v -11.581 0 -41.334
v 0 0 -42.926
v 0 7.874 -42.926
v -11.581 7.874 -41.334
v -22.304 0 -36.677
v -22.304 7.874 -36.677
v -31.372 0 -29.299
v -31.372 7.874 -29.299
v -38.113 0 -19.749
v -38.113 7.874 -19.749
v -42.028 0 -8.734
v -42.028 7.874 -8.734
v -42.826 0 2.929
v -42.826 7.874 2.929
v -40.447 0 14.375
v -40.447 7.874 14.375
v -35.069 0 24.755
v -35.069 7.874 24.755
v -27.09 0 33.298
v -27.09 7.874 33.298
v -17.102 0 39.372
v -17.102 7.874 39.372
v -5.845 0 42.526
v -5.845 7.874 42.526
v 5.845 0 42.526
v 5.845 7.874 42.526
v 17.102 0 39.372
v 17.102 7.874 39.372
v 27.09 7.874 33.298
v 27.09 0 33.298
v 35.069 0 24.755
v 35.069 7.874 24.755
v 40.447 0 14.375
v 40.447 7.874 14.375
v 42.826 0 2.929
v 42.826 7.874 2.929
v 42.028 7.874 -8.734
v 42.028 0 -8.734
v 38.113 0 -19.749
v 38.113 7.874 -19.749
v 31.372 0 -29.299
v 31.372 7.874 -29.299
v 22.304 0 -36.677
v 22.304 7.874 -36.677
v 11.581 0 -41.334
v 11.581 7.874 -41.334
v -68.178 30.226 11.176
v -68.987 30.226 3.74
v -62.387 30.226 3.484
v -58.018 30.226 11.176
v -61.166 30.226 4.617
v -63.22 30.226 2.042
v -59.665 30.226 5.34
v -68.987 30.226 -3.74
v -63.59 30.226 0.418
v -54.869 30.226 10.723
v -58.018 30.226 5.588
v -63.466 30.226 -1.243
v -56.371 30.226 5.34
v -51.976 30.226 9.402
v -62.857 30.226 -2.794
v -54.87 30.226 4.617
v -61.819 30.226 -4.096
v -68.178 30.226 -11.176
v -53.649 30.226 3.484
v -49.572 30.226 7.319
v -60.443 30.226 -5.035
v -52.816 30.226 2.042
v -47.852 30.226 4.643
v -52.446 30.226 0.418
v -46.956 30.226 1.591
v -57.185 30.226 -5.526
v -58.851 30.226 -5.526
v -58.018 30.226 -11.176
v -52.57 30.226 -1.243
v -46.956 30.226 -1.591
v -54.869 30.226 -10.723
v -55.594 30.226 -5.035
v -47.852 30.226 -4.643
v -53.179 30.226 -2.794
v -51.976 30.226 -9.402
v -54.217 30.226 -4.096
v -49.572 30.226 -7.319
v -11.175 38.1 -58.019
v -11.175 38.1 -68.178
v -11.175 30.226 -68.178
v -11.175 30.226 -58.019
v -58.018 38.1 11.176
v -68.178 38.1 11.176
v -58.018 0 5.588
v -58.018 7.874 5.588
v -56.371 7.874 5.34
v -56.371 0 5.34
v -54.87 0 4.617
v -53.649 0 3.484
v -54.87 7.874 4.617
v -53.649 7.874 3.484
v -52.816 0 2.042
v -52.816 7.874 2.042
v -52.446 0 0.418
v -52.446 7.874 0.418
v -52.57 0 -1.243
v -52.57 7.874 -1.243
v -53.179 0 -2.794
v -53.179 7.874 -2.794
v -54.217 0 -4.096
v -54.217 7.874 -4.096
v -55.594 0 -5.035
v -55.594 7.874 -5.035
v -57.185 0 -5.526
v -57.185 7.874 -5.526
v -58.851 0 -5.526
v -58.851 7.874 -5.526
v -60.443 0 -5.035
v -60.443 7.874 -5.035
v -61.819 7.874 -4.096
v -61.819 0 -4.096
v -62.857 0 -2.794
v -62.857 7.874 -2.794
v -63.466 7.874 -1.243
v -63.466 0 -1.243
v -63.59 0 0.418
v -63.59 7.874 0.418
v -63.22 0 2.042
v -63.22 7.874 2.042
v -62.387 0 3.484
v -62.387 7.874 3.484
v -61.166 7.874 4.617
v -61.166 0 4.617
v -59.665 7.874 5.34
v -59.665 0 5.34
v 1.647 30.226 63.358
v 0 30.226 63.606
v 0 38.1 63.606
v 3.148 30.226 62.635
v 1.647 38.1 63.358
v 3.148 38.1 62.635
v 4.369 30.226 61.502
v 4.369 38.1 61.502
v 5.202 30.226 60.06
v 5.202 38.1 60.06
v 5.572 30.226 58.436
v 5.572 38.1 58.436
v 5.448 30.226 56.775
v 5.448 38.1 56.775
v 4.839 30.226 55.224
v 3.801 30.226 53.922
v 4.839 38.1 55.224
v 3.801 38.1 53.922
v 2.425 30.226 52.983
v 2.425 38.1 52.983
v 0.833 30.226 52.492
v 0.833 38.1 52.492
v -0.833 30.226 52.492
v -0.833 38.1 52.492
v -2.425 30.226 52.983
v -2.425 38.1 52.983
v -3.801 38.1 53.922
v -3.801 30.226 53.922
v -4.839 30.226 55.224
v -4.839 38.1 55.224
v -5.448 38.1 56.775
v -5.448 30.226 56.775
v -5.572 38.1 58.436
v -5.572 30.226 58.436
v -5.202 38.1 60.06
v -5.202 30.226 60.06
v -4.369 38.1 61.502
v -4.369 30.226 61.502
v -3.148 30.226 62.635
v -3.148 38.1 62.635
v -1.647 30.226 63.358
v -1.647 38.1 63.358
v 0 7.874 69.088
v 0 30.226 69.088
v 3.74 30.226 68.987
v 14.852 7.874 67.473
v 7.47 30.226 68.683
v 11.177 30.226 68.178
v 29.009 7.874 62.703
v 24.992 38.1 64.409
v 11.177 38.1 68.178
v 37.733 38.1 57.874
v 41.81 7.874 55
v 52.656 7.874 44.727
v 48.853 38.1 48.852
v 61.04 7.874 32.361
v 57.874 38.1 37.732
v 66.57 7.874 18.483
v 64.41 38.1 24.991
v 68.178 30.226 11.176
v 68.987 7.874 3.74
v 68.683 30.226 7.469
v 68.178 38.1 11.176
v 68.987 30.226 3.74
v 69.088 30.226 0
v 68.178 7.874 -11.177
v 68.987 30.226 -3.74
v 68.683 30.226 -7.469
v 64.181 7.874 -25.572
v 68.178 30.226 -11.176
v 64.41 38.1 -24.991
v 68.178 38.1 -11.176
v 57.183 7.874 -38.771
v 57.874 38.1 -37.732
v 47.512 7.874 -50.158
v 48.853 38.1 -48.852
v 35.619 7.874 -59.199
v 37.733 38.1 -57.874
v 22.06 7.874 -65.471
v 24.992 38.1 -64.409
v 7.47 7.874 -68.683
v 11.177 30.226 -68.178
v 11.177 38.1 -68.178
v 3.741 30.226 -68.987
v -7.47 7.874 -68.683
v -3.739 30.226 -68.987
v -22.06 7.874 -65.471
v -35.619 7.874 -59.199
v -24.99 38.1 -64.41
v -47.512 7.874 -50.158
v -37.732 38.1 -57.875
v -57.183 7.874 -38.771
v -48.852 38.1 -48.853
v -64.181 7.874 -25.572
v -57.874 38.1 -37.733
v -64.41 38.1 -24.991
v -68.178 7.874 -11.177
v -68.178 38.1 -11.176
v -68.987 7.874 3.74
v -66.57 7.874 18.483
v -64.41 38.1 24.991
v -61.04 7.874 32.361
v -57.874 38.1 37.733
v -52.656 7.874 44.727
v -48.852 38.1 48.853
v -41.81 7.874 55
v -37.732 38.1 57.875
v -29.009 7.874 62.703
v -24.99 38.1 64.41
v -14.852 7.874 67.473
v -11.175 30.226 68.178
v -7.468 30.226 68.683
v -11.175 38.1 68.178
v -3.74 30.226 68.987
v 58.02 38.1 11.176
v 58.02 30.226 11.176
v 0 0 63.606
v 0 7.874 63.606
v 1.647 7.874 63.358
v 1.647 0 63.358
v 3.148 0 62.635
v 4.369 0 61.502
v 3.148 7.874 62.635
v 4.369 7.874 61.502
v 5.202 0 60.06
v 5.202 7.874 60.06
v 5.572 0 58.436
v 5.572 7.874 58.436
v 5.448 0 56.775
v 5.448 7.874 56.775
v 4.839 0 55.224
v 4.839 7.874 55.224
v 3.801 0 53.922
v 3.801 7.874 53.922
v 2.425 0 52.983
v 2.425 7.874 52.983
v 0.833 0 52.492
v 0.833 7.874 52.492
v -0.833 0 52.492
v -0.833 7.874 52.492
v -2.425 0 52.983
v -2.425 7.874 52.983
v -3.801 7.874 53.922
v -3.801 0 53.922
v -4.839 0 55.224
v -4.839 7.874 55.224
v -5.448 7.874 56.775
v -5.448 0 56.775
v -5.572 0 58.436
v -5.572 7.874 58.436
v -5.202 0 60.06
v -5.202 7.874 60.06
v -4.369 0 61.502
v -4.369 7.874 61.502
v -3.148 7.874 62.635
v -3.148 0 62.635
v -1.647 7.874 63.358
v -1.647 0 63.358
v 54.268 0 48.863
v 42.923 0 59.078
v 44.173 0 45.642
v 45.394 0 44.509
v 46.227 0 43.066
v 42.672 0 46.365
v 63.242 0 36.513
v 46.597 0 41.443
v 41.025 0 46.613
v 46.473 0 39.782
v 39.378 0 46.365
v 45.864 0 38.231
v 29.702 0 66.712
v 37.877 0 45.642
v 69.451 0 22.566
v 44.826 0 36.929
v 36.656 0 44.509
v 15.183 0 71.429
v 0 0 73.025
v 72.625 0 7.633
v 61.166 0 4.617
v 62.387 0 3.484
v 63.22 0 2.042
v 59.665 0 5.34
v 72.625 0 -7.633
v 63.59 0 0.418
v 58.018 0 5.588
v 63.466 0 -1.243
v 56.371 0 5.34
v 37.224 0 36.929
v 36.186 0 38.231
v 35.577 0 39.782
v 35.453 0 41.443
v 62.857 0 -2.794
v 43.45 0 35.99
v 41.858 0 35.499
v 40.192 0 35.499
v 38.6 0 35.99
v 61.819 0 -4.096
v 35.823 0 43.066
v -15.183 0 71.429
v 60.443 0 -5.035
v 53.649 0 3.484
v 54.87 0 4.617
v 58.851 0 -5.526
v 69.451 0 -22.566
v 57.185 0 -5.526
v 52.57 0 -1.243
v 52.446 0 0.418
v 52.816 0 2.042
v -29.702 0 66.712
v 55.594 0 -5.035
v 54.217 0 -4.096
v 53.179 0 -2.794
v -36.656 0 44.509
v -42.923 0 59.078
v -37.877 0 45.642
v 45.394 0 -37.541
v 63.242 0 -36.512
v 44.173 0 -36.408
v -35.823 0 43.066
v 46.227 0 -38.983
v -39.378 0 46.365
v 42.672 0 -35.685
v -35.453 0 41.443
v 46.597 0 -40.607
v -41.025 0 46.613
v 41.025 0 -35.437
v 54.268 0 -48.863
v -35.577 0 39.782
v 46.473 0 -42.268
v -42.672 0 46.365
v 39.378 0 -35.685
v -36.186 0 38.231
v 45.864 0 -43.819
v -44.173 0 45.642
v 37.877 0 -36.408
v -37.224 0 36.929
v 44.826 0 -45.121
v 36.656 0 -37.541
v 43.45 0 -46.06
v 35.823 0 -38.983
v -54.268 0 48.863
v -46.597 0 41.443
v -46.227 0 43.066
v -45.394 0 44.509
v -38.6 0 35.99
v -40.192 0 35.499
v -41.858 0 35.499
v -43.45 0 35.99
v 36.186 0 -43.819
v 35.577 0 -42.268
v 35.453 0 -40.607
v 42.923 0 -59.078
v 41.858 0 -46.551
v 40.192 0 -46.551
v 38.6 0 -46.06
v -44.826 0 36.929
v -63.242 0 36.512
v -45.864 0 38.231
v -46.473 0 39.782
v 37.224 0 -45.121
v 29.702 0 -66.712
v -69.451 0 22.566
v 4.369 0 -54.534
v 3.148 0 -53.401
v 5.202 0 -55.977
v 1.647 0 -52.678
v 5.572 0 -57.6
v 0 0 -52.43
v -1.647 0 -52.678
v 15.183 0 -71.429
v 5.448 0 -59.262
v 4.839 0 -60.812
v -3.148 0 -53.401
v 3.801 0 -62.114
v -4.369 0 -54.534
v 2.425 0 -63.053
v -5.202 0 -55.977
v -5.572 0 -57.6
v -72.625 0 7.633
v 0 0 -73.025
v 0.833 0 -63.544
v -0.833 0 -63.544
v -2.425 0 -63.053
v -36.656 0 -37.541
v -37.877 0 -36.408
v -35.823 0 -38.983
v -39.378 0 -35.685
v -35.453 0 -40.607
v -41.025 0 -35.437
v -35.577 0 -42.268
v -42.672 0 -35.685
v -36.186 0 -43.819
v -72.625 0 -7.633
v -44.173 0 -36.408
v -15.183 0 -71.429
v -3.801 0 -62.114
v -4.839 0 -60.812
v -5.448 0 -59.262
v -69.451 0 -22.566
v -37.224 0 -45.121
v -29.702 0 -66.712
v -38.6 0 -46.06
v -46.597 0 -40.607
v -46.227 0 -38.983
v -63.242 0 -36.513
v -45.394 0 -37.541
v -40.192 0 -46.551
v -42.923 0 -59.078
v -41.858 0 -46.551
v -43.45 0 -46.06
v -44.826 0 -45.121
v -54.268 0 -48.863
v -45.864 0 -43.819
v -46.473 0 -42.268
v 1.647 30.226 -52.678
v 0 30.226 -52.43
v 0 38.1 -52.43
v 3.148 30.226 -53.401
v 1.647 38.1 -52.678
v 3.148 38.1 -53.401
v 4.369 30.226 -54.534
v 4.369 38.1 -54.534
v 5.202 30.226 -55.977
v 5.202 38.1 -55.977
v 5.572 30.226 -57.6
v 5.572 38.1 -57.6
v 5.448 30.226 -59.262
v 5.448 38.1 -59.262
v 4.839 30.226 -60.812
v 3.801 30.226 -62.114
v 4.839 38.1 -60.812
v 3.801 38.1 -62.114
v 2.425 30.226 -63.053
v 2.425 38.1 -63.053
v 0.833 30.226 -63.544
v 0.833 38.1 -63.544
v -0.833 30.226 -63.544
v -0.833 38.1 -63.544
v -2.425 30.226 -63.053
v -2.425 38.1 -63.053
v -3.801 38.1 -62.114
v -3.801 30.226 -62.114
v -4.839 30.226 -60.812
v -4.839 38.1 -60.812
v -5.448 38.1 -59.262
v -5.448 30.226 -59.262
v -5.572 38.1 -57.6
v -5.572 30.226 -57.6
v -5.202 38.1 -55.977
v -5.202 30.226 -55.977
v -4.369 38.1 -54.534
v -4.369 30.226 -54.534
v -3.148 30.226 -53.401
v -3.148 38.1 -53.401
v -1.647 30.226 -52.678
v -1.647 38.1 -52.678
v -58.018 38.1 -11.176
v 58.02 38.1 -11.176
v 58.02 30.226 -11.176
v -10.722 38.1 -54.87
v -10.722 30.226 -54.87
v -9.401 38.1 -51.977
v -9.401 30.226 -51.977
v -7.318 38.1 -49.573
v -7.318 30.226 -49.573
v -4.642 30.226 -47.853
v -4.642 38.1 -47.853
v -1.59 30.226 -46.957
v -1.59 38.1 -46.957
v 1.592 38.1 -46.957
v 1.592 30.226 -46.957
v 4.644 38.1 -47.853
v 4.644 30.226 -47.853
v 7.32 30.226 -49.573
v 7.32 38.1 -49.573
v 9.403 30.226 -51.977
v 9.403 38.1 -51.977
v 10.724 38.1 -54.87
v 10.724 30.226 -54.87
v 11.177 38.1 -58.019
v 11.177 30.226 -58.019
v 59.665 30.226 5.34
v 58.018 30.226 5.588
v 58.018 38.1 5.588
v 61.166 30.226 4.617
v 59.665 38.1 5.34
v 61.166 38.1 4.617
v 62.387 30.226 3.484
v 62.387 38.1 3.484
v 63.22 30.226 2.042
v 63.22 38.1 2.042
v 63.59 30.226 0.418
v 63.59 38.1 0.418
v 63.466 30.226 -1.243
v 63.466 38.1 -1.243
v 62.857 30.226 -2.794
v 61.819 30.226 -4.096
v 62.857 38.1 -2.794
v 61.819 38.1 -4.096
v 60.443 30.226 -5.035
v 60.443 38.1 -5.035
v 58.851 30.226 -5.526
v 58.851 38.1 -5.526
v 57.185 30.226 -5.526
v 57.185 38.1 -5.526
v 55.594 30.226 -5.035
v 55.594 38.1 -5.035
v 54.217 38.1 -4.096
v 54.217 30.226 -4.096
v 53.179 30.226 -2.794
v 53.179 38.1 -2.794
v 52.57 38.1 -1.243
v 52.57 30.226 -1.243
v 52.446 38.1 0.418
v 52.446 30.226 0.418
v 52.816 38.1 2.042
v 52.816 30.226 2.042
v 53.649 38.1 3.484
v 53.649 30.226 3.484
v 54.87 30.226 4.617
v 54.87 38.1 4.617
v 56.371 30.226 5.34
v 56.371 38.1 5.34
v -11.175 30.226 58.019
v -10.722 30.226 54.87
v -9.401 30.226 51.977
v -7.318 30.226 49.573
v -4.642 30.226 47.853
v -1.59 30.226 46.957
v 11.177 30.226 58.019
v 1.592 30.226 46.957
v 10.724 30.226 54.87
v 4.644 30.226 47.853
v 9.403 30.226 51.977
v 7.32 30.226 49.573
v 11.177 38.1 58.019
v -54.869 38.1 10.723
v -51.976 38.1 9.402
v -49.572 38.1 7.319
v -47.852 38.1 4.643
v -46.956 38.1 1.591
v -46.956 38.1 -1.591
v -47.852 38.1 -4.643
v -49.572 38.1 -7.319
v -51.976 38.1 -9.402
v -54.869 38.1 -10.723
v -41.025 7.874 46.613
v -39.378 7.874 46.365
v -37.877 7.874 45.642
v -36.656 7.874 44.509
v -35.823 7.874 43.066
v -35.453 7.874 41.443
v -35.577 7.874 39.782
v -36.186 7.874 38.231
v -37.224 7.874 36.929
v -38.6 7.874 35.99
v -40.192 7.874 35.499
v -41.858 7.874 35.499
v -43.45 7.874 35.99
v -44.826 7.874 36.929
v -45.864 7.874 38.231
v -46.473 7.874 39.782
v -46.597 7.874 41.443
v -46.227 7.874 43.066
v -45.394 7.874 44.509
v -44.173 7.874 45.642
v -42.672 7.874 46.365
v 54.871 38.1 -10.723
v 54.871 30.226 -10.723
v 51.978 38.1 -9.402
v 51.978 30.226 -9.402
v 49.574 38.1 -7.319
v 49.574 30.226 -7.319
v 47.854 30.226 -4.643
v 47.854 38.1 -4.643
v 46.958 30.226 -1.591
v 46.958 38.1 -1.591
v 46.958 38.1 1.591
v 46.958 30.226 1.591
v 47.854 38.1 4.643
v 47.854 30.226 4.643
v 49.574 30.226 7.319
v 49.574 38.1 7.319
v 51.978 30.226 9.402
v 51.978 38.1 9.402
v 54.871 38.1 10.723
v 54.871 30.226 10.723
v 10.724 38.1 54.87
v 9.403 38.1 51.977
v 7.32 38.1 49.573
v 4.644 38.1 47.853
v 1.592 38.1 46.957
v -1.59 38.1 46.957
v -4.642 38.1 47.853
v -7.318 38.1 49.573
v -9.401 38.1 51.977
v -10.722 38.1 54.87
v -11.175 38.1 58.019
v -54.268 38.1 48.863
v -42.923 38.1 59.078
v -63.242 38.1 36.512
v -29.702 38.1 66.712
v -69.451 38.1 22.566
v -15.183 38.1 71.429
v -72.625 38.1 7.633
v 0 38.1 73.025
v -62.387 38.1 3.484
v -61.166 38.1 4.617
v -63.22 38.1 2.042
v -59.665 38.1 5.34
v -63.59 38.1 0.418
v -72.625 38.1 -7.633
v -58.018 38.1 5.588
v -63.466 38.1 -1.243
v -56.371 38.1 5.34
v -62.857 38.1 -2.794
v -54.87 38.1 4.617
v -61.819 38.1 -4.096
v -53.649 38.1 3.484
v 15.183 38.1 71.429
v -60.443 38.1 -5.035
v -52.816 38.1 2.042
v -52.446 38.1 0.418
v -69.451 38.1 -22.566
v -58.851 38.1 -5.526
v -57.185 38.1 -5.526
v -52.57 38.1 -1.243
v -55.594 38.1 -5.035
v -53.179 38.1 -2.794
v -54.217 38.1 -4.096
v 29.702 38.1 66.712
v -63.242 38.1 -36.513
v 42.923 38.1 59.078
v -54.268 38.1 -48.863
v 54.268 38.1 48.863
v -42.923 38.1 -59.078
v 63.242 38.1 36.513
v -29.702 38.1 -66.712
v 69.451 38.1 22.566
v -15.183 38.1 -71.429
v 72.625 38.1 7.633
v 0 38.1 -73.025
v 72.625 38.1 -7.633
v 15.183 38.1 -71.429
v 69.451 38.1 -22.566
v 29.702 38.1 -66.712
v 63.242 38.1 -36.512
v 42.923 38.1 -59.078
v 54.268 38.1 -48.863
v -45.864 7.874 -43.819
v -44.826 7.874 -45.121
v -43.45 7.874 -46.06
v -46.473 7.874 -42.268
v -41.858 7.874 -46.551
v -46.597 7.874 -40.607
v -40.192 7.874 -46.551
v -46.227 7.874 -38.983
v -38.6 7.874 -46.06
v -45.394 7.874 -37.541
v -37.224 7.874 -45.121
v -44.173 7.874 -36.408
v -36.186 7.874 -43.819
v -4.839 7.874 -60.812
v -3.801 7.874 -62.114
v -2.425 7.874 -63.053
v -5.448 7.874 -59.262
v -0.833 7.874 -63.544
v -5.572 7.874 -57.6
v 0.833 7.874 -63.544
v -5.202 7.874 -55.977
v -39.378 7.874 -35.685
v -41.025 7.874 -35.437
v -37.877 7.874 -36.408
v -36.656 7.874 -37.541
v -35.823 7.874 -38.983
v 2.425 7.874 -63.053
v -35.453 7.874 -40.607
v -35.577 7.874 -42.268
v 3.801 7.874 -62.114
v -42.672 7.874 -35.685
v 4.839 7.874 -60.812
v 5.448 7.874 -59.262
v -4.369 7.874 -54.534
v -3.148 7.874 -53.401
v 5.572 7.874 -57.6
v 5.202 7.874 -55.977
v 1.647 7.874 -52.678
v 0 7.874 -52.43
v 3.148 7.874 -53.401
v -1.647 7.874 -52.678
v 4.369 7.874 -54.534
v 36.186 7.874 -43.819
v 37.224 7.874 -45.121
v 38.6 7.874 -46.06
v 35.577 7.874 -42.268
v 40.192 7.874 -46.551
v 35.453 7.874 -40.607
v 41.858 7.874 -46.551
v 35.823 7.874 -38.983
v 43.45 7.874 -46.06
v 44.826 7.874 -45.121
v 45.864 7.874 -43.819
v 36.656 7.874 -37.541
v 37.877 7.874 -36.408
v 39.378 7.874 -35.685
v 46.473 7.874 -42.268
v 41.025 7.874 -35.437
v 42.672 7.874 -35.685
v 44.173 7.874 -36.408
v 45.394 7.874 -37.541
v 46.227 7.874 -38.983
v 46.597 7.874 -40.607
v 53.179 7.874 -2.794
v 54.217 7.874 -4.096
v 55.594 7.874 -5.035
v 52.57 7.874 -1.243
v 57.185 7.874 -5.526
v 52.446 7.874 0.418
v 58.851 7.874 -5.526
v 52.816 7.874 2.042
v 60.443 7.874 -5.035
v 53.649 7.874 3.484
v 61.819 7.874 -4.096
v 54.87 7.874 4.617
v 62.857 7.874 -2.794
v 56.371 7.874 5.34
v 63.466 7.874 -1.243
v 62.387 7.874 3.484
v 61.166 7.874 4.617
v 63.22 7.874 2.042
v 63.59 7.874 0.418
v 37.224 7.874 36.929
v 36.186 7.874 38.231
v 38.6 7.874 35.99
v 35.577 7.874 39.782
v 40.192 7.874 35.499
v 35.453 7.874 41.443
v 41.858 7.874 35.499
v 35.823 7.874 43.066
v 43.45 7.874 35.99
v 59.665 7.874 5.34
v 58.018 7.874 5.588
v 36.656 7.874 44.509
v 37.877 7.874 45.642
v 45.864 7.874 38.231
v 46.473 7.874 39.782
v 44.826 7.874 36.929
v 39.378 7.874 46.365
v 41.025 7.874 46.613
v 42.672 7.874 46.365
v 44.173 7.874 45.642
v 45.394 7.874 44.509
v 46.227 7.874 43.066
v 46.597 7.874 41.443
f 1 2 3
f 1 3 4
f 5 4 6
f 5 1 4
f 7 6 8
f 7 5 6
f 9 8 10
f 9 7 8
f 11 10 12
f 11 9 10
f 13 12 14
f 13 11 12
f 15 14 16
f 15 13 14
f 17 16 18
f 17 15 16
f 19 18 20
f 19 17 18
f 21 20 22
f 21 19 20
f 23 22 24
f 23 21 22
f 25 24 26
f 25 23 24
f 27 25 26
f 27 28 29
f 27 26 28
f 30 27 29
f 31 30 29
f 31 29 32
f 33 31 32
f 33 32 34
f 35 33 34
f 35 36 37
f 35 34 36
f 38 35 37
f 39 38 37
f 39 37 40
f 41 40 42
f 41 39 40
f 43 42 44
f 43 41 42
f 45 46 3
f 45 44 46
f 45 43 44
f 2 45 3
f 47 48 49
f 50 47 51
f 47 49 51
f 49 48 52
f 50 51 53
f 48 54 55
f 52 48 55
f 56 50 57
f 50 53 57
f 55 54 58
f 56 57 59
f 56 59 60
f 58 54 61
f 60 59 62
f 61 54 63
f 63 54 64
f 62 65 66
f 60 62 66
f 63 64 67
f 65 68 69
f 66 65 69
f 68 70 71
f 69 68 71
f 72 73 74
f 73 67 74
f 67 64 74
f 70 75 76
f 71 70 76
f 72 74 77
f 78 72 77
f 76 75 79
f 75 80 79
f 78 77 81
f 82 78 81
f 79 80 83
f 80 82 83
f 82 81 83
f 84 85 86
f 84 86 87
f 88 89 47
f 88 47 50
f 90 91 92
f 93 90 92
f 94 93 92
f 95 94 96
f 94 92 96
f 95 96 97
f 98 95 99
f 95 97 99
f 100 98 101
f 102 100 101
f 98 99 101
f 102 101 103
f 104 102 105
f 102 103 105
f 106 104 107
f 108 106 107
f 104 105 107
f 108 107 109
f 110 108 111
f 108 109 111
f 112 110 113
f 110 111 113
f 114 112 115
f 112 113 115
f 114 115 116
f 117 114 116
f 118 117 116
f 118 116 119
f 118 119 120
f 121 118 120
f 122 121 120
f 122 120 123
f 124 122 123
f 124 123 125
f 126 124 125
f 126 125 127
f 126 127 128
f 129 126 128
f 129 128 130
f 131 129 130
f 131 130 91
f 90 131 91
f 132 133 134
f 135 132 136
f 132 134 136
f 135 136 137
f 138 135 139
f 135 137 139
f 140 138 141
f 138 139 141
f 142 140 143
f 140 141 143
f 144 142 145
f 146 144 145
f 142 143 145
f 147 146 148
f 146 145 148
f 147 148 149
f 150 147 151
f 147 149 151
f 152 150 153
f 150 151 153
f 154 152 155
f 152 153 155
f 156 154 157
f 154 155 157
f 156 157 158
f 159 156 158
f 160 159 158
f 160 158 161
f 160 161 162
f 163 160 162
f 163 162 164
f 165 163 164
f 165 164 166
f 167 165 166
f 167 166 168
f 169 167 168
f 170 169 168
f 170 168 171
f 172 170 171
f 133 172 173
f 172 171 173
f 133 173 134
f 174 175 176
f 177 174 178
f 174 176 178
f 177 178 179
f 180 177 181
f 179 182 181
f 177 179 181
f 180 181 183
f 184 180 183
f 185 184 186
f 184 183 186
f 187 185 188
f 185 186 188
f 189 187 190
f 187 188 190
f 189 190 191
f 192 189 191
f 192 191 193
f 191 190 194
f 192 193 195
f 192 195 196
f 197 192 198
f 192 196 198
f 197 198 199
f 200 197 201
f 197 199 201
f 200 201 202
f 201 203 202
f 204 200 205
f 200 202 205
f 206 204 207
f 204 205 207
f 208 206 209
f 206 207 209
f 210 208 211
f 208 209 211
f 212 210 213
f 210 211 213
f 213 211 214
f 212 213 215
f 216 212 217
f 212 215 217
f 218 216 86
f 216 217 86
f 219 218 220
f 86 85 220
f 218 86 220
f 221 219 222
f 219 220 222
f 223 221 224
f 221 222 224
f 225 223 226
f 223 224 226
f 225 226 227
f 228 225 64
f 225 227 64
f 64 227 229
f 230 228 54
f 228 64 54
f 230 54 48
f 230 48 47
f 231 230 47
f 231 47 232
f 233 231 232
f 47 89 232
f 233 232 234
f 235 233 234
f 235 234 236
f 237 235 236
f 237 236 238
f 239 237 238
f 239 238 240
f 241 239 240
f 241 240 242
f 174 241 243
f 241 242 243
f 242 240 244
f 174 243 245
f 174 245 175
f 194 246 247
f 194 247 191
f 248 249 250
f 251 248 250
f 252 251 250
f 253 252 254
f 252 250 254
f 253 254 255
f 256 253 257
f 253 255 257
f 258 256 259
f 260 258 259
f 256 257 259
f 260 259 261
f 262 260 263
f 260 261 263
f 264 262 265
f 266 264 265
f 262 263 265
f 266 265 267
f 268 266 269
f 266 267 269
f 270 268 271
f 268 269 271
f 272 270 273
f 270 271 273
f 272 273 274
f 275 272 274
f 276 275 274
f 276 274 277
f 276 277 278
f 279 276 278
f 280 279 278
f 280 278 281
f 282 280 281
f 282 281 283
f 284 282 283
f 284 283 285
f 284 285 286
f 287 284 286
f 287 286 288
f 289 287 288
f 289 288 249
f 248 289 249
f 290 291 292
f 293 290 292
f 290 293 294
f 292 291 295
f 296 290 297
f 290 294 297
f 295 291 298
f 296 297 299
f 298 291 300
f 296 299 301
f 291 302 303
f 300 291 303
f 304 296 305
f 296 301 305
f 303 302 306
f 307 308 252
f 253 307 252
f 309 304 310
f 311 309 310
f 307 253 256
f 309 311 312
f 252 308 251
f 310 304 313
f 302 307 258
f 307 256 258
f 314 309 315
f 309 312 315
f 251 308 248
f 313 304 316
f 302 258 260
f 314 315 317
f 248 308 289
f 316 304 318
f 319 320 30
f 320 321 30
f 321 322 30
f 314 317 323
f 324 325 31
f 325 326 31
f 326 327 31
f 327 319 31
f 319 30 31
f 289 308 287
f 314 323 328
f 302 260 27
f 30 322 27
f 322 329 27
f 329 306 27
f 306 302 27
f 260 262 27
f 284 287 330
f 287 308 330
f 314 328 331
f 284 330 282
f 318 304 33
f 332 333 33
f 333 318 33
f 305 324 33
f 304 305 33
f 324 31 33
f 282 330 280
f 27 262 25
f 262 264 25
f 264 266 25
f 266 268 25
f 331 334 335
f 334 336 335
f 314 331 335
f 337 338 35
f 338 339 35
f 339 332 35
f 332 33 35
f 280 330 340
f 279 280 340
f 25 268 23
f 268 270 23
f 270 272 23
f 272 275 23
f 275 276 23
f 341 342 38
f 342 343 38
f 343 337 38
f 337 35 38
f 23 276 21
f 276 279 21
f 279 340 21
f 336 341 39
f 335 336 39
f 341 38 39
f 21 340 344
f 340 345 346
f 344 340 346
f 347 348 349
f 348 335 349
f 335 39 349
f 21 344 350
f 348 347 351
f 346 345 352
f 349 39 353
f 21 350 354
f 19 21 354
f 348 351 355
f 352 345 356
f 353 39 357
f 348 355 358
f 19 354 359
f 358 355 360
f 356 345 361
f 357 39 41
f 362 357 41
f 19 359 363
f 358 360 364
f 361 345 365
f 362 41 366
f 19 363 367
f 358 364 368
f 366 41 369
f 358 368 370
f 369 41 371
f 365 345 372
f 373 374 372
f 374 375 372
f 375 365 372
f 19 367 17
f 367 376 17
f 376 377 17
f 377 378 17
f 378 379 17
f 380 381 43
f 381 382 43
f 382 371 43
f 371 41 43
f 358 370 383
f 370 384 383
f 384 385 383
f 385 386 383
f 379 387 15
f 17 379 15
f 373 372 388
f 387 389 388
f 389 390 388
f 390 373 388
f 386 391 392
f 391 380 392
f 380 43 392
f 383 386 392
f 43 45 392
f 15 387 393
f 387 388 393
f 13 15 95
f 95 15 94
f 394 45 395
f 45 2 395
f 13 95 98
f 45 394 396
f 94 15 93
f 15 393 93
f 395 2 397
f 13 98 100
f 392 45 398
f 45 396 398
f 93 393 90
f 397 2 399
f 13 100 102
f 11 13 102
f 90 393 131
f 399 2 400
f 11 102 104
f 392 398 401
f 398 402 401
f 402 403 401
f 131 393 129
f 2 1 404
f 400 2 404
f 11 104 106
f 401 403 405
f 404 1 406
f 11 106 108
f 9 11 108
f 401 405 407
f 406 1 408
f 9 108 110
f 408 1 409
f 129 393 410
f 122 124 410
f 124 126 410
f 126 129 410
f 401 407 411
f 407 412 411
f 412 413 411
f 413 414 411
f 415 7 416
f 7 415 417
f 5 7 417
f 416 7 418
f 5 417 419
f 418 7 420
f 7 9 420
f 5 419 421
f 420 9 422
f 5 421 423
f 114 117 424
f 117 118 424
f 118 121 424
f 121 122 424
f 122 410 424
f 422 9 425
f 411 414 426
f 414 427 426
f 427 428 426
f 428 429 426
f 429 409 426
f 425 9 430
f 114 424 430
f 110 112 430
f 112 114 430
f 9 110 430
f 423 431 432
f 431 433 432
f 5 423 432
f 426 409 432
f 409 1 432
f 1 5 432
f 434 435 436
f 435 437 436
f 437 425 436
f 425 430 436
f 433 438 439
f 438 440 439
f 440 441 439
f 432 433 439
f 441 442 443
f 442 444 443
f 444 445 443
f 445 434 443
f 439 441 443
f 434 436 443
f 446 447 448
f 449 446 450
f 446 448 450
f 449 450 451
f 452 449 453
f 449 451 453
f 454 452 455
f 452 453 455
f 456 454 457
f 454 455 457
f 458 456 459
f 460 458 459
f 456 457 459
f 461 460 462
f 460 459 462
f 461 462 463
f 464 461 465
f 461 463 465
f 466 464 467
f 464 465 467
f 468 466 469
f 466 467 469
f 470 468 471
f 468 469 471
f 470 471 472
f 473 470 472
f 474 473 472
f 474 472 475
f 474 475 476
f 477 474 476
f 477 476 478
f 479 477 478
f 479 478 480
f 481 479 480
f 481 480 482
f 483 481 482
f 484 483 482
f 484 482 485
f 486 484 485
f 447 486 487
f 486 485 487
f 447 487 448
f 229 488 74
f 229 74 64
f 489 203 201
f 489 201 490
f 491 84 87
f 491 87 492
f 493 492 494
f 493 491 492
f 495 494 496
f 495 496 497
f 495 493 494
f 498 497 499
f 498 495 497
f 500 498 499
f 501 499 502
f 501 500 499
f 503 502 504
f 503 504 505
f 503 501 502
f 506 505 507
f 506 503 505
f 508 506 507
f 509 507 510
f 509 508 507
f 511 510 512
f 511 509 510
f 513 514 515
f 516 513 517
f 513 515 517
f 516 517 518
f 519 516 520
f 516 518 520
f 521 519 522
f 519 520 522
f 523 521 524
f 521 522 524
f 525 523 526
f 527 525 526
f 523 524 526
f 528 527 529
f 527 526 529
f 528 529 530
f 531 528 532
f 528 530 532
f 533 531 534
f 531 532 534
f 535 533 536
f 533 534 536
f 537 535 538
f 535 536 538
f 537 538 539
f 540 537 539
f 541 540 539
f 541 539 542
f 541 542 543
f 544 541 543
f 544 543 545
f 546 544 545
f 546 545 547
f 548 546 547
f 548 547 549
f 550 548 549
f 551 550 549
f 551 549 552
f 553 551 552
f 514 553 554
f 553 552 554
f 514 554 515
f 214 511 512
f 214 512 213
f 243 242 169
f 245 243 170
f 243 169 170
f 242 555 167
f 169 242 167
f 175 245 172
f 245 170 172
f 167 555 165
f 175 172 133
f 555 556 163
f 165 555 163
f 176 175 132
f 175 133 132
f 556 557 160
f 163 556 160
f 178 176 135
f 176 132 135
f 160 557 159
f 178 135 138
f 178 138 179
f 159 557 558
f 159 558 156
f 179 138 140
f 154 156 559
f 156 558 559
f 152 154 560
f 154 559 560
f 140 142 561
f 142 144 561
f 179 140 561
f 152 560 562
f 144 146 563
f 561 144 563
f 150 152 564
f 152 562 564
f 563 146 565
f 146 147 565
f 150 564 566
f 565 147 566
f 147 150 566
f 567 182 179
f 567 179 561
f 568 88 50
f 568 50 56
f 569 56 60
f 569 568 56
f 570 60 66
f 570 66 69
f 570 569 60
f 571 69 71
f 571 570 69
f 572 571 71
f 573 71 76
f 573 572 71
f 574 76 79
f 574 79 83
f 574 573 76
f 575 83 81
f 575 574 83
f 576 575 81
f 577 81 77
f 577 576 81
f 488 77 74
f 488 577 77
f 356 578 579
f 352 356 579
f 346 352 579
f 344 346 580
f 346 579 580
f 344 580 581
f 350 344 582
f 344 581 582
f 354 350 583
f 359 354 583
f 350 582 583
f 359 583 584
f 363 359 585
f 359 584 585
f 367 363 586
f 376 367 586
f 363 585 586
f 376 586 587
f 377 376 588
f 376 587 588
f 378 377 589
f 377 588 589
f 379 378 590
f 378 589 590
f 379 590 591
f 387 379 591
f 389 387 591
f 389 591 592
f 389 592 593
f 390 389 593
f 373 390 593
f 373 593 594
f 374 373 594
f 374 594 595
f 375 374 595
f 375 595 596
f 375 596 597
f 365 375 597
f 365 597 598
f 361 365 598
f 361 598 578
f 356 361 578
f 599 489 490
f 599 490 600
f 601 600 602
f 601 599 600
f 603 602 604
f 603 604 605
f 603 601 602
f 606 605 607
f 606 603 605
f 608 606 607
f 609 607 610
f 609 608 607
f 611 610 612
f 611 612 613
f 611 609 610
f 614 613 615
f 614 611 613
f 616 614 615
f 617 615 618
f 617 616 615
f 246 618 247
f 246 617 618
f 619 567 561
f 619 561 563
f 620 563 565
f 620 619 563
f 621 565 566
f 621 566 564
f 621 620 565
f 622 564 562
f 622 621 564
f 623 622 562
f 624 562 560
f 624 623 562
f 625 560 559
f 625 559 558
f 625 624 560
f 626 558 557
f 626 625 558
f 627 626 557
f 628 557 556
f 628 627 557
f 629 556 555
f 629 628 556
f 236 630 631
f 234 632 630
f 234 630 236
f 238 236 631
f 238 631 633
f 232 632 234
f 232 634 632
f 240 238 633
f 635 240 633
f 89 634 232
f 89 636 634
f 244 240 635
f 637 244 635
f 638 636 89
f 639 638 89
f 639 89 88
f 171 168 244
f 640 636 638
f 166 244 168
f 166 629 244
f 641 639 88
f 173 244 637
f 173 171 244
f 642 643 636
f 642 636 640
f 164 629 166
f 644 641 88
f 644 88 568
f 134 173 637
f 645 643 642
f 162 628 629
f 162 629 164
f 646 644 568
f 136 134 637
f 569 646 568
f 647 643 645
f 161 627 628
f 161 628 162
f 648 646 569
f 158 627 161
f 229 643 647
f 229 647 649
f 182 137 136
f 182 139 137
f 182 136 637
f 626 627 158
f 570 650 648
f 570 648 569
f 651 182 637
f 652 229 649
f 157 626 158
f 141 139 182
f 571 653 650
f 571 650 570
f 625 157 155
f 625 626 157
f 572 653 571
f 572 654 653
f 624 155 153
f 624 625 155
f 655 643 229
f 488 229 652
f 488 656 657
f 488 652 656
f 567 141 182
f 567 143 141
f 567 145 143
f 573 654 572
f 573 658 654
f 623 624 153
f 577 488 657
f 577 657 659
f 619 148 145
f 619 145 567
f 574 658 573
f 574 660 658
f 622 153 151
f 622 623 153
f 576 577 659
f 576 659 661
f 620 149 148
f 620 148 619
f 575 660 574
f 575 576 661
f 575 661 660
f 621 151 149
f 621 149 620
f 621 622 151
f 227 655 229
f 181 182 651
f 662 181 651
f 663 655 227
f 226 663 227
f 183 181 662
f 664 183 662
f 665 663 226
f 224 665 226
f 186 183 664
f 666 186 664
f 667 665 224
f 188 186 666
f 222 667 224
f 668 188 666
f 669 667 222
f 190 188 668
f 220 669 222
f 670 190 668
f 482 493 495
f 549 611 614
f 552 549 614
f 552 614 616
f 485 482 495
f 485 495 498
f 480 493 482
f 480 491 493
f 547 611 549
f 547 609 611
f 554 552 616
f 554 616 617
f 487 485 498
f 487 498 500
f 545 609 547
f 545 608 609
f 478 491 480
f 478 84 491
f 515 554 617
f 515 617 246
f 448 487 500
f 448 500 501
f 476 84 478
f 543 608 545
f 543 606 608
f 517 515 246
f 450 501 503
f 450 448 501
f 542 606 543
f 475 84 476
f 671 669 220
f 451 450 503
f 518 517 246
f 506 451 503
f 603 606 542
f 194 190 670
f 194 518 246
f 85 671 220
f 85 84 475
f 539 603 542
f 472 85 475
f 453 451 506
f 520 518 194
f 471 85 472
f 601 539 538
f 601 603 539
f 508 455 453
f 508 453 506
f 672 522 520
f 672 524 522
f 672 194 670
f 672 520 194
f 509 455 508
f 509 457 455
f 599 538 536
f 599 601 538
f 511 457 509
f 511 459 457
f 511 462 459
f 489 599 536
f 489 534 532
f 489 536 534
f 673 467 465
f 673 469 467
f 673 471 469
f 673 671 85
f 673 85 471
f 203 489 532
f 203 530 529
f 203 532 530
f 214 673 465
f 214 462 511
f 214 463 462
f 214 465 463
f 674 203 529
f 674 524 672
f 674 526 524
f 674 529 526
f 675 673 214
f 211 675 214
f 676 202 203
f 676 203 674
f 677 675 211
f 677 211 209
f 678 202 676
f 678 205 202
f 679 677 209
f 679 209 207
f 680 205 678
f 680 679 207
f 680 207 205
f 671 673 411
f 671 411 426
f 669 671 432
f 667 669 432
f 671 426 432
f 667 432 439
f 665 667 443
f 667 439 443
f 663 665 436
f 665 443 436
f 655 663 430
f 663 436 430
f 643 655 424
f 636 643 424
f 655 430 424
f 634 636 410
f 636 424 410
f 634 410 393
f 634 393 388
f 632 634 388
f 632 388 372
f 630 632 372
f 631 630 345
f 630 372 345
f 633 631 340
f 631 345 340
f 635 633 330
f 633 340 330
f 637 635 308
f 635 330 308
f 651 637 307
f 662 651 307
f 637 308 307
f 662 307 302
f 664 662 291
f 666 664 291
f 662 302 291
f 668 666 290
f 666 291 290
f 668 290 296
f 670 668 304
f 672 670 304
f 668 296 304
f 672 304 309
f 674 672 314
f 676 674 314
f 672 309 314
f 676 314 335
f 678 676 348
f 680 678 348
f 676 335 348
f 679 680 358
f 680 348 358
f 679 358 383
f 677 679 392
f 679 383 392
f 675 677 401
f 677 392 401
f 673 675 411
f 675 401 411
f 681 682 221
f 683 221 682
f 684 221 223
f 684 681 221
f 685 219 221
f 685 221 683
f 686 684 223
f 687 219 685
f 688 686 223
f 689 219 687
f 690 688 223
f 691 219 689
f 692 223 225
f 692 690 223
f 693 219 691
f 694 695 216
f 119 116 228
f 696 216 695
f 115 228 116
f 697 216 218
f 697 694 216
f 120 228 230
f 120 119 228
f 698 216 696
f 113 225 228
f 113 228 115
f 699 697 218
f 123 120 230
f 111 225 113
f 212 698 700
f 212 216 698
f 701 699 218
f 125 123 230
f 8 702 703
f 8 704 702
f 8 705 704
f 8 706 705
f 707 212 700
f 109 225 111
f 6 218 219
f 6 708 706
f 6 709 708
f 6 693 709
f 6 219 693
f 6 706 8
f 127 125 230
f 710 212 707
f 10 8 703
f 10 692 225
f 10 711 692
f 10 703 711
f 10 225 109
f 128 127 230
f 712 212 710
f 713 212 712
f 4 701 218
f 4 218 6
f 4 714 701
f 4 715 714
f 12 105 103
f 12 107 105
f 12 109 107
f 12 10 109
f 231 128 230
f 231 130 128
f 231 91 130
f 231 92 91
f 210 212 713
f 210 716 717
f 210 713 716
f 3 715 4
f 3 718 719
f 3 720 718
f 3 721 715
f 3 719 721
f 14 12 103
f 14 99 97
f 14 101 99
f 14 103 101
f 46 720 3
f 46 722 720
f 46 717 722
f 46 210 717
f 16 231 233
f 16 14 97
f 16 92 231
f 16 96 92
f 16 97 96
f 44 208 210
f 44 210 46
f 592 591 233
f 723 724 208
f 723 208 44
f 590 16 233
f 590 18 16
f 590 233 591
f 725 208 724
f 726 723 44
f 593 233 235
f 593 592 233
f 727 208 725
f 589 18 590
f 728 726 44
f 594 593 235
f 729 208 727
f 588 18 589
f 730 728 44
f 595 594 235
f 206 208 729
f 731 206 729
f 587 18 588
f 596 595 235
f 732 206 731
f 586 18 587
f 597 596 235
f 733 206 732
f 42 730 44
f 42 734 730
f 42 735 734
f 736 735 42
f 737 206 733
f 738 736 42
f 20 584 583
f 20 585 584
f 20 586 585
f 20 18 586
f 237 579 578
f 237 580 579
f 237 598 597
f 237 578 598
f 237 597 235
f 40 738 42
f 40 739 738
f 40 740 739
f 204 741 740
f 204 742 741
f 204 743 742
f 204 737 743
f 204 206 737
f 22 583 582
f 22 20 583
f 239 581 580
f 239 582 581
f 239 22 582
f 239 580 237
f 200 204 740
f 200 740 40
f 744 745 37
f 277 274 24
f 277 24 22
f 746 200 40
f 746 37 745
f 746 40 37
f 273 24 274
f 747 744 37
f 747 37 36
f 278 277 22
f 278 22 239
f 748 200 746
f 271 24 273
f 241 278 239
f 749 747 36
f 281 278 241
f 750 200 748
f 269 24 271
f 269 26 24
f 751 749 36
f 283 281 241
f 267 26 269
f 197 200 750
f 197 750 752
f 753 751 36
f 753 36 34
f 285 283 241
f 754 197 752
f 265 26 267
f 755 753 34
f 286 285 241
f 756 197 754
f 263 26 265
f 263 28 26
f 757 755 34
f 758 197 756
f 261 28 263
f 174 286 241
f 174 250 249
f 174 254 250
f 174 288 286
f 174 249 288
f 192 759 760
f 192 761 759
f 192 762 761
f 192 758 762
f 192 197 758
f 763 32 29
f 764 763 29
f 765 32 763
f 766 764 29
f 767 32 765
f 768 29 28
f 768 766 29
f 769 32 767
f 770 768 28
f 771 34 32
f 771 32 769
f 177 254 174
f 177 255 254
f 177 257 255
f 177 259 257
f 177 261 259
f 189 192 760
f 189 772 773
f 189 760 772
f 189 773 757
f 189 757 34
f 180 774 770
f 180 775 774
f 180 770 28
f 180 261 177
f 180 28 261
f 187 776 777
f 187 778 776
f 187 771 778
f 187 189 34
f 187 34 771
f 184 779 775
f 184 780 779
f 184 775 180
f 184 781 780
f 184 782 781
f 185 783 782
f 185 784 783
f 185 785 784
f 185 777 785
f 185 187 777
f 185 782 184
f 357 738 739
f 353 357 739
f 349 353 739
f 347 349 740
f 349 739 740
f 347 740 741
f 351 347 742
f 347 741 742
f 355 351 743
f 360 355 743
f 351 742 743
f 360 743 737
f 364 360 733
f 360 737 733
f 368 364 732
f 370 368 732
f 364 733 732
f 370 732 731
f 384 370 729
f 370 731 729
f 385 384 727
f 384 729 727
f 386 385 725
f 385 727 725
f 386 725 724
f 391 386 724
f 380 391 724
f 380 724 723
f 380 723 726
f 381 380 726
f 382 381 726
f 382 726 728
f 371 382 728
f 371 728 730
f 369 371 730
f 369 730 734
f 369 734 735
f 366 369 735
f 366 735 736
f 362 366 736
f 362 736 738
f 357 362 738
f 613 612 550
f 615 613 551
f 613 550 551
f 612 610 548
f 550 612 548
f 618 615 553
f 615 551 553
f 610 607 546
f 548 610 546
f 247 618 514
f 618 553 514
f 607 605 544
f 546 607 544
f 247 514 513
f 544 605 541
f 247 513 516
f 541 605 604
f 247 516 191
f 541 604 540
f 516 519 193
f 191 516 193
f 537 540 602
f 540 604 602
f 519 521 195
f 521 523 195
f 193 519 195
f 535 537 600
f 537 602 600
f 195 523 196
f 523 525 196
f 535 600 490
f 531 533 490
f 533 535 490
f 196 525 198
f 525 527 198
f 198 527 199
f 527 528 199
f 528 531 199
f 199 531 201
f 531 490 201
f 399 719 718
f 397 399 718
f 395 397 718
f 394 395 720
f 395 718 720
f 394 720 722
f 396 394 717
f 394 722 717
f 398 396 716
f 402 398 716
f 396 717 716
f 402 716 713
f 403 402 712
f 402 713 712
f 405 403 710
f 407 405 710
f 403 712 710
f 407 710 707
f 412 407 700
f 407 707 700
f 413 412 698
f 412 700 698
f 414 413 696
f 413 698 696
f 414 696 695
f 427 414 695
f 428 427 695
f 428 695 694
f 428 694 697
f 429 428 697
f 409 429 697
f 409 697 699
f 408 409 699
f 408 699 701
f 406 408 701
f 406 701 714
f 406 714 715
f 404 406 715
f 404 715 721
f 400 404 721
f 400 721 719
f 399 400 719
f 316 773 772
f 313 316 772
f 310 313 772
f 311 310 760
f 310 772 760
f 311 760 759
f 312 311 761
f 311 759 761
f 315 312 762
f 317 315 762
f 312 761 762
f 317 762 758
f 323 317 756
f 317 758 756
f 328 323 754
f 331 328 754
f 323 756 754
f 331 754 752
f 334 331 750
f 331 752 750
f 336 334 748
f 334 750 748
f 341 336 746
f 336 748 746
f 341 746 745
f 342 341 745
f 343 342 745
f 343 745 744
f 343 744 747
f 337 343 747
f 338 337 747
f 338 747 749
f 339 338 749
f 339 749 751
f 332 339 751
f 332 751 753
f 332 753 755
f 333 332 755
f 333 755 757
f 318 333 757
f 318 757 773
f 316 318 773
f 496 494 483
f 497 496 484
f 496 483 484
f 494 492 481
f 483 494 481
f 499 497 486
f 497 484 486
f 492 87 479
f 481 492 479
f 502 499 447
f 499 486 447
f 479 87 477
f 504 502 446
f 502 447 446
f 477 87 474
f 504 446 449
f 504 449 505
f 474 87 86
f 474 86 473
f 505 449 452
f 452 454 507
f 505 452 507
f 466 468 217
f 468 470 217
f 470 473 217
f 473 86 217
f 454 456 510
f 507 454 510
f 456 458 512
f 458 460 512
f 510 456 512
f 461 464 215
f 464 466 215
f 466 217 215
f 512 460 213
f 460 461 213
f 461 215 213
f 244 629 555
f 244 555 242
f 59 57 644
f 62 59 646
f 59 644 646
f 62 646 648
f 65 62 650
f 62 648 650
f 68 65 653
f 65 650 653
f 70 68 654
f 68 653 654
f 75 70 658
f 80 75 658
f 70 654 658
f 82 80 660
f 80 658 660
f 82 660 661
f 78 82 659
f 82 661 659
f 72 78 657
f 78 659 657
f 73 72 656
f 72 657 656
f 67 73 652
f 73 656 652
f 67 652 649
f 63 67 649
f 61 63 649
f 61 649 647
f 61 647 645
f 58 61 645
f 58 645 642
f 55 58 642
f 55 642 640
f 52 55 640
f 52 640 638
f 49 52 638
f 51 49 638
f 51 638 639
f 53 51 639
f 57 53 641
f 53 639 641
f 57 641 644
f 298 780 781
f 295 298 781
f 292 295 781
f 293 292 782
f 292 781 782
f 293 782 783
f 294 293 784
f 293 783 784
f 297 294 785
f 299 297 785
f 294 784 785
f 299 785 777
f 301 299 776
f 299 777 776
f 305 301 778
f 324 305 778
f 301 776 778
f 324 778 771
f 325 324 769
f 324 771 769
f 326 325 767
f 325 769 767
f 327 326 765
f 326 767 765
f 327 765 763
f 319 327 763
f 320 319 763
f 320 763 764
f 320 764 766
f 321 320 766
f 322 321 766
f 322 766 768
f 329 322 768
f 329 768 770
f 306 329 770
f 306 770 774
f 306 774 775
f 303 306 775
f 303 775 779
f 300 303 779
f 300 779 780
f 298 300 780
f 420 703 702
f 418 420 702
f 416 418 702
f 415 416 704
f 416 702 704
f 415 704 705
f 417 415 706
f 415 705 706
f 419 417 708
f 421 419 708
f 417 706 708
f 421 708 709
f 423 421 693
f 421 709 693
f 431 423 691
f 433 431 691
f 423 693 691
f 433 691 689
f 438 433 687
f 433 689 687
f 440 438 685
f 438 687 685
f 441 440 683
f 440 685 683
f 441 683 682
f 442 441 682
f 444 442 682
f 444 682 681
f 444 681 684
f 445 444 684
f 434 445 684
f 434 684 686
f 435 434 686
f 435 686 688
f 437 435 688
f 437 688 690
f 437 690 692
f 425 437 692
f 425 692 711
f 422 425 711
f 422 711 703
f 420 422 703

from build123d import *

# Parameters (mm, degrees)
SKETCH1_R           = 73.025
SKETCH1_R_2         = 42.926
BOSS_EXTRUDE1_DEPTH = 38.1
SKETCH2_R           = 69.088
CUT_EXTRUDE1_DEPTH  = 30.226
SKETCH4_R           = 5.588
BOSS_EXTRUDE2_DEPTH = 7.874
SKETCH4_3_R         = 5.588
CUT_EXTRUDE2_DEPTH  = 111.076842478
SKETCH4_4_R         = 5.588
CUT_EXTRUDE3_DEPTH  = 111.076842478


with BuildPart() as part:
    # Sketch1 → Boss-Extrude1 (new body)
    with BuildSketch(Plane(origin=(0, 0, 0), x_dir=(1, 0, 0), z_dir=(0, 1, 0))):
        Circle(SKETCH1_R)
        Circle(SKETCH1_R_2, mode=Mode.SUBTRACT)
    extrude(amount=BOSS_EXTRUDE1_DEPTH)

    # Sketch2 → Cut-Extrude1 (cut)
    with BuildSketch(Plane(origin=(0, 38.1, 0), x_dir=(1, 0, 0), z_dir=(0, 1, 0))):
        Circle(SKETCH2_R)
    extrude(amount=-CUT_EXTRUDE1_DEPTH, mode=Mode.SUBTRACT)

    # Sketch4 → Boss-Extrude2 (add)
    # profile 1 of 4: a face of its own
    with BuildSketch(Plane(origin=(0, 38.1, 0), x_dir=(1, 0, 0), z_dir=(0, 1, 0))):
        with BuildLine():
            Line((-58.01806662, 11.176), (-68.17806662, 11.176))
            ThreePointArc((-68.17806662, 11.176), (-69.088, 0), (-68.17806662, -11.176))
            Line((-68.17806662, -11.176), (-58.01806662, -11.176))
            ThreePointArc((-58.01806662, -11.176), (-46.84206662, 0), (-58.01806662, 11.176))
        make_face()
        with Locations((-58.01806662, 0)):
            Circle(SKETCH4_R, mode=Mode.SUBTRACT)
    # profile 2 of 4: a face of its own
    with BuildSketch(Plane(origin=(0, 38.1, 0), x_dir=(1, 0, 0), z_dir=(0, 1, 0))):
        with BuildLine():
            ThreePointArc((11.177, 68.177902688), (0.001013346, 69.087999993), (-11.175, 68.178230536))
            Line((-11.175, 68.178230536), (-11.175, 58.01906662))
            ThreePointArc((-11.175, 58.01906662), (0.001, 46.84306662), (11.177, 58.01906662))
            Line((11.177, 58.01906662), (11.177, 68.177902688))
        make_face()
        with Locations((0, 58.01806662)):
            Circle(SKETCH4_R, mode=Mode.SUBTRACT)
    # profile 3 of 4: a face of its own
    with BuildSketch(Plane(origin=(0, 38.1, 0), x_dir=(1, 0, 0), z_dir=(0, 1, 0))):
        with BuildLine():
            Line((-11.175, -58.01906662), (-11.175, -68.178230536))
            ThreePointArc((-11.175, -68.178230536), (0.001013346, -69.087999993), (11.177, -68.177902688))
            Line((11.177, -68.177902688), (11.177, -58.01906662))
            ThreePointArc((11.177, -58.01906662), (0.001, -46.84306662), (-11.175, -58.01906662))
        make_face()
        with Locations((0, -58.01806662)):
            Circle(SKETCH4_R, mode=Mode.SUBTRACT)
    # profile 4 of 4: a face of its own
    with BuildSketch(Plane(origin=(0, 38.1, 0), x_dir=(1, 0, 0), z_dir=(0, 1, 0))):
        with BuildLine():
            ThreePointArc((68.17806662, -11.176), (69.088, 0), (68.17806662, 11.176))
            Line((68.17806662, 11.176), (58.02006662, 11.176))
            ThreePointArc((58.02006662, 11.176), (46.84406662, 0), (58.02006662, -11.176))
            Line((58.02006662, -11.176), (68.17806662, -11.176))
        make_face()
        with Locations((58.01806662, 0)):
            Circle(SKETCH4_R, mode=Mode.SUBTRACT)
    extrude(amount=-BOSS_EXTRUDE2_DEPTH)

    # Sketch4<3> → Cut-Extrude2 (cut, through all)
    with BuildSketch(Plane(origin=(0, 38.1, 0), x_dir=(1, 0, 0), z_dir=(0, 1, 0))):
        with Locations((-41.024968338, 41.024968338)):
            Circle(SKETCH4_3_R)
        with Locations((41.024968338, 41.024968338)):
            Circle(SKETCH4_3_R)
        with Locations((41.024968338, -41.024968338)):
            Circle(SKETCH4_3_R)
        with Locations((-41.024968338, -41.024968338)):
            Circle(SKETCH4_3_R)
    extrude(amount=-CUT_EXTRUDE2_DEPTH, mode=Mode.SUBTRACT)

    # Sketch4<4> → Cut-Extrude3 (cut, through all)
    with BuildSketch(Plane(origin=(0, 38.1, 0), x_dir=(1, 0, 0), z_dir=(0, 1, 0))):
        with Locations((-58.01806662, 0)):
            Circle(SKETCH4_4_R)
        with Locations((0, 58.01806662)):
            Circle(SKETCH4_4_R)
        with Locations((58.01806662, 0)):
            Circle(SKETCH4_4_R)
        with Locations((0, -58.01806662)):
            Circle(SKETCH4_4_R)
    extrude(amount=-CUT_EXTRUDE3_DEPTH, mode=Mode.SUBTRACT)


solid = part.part
